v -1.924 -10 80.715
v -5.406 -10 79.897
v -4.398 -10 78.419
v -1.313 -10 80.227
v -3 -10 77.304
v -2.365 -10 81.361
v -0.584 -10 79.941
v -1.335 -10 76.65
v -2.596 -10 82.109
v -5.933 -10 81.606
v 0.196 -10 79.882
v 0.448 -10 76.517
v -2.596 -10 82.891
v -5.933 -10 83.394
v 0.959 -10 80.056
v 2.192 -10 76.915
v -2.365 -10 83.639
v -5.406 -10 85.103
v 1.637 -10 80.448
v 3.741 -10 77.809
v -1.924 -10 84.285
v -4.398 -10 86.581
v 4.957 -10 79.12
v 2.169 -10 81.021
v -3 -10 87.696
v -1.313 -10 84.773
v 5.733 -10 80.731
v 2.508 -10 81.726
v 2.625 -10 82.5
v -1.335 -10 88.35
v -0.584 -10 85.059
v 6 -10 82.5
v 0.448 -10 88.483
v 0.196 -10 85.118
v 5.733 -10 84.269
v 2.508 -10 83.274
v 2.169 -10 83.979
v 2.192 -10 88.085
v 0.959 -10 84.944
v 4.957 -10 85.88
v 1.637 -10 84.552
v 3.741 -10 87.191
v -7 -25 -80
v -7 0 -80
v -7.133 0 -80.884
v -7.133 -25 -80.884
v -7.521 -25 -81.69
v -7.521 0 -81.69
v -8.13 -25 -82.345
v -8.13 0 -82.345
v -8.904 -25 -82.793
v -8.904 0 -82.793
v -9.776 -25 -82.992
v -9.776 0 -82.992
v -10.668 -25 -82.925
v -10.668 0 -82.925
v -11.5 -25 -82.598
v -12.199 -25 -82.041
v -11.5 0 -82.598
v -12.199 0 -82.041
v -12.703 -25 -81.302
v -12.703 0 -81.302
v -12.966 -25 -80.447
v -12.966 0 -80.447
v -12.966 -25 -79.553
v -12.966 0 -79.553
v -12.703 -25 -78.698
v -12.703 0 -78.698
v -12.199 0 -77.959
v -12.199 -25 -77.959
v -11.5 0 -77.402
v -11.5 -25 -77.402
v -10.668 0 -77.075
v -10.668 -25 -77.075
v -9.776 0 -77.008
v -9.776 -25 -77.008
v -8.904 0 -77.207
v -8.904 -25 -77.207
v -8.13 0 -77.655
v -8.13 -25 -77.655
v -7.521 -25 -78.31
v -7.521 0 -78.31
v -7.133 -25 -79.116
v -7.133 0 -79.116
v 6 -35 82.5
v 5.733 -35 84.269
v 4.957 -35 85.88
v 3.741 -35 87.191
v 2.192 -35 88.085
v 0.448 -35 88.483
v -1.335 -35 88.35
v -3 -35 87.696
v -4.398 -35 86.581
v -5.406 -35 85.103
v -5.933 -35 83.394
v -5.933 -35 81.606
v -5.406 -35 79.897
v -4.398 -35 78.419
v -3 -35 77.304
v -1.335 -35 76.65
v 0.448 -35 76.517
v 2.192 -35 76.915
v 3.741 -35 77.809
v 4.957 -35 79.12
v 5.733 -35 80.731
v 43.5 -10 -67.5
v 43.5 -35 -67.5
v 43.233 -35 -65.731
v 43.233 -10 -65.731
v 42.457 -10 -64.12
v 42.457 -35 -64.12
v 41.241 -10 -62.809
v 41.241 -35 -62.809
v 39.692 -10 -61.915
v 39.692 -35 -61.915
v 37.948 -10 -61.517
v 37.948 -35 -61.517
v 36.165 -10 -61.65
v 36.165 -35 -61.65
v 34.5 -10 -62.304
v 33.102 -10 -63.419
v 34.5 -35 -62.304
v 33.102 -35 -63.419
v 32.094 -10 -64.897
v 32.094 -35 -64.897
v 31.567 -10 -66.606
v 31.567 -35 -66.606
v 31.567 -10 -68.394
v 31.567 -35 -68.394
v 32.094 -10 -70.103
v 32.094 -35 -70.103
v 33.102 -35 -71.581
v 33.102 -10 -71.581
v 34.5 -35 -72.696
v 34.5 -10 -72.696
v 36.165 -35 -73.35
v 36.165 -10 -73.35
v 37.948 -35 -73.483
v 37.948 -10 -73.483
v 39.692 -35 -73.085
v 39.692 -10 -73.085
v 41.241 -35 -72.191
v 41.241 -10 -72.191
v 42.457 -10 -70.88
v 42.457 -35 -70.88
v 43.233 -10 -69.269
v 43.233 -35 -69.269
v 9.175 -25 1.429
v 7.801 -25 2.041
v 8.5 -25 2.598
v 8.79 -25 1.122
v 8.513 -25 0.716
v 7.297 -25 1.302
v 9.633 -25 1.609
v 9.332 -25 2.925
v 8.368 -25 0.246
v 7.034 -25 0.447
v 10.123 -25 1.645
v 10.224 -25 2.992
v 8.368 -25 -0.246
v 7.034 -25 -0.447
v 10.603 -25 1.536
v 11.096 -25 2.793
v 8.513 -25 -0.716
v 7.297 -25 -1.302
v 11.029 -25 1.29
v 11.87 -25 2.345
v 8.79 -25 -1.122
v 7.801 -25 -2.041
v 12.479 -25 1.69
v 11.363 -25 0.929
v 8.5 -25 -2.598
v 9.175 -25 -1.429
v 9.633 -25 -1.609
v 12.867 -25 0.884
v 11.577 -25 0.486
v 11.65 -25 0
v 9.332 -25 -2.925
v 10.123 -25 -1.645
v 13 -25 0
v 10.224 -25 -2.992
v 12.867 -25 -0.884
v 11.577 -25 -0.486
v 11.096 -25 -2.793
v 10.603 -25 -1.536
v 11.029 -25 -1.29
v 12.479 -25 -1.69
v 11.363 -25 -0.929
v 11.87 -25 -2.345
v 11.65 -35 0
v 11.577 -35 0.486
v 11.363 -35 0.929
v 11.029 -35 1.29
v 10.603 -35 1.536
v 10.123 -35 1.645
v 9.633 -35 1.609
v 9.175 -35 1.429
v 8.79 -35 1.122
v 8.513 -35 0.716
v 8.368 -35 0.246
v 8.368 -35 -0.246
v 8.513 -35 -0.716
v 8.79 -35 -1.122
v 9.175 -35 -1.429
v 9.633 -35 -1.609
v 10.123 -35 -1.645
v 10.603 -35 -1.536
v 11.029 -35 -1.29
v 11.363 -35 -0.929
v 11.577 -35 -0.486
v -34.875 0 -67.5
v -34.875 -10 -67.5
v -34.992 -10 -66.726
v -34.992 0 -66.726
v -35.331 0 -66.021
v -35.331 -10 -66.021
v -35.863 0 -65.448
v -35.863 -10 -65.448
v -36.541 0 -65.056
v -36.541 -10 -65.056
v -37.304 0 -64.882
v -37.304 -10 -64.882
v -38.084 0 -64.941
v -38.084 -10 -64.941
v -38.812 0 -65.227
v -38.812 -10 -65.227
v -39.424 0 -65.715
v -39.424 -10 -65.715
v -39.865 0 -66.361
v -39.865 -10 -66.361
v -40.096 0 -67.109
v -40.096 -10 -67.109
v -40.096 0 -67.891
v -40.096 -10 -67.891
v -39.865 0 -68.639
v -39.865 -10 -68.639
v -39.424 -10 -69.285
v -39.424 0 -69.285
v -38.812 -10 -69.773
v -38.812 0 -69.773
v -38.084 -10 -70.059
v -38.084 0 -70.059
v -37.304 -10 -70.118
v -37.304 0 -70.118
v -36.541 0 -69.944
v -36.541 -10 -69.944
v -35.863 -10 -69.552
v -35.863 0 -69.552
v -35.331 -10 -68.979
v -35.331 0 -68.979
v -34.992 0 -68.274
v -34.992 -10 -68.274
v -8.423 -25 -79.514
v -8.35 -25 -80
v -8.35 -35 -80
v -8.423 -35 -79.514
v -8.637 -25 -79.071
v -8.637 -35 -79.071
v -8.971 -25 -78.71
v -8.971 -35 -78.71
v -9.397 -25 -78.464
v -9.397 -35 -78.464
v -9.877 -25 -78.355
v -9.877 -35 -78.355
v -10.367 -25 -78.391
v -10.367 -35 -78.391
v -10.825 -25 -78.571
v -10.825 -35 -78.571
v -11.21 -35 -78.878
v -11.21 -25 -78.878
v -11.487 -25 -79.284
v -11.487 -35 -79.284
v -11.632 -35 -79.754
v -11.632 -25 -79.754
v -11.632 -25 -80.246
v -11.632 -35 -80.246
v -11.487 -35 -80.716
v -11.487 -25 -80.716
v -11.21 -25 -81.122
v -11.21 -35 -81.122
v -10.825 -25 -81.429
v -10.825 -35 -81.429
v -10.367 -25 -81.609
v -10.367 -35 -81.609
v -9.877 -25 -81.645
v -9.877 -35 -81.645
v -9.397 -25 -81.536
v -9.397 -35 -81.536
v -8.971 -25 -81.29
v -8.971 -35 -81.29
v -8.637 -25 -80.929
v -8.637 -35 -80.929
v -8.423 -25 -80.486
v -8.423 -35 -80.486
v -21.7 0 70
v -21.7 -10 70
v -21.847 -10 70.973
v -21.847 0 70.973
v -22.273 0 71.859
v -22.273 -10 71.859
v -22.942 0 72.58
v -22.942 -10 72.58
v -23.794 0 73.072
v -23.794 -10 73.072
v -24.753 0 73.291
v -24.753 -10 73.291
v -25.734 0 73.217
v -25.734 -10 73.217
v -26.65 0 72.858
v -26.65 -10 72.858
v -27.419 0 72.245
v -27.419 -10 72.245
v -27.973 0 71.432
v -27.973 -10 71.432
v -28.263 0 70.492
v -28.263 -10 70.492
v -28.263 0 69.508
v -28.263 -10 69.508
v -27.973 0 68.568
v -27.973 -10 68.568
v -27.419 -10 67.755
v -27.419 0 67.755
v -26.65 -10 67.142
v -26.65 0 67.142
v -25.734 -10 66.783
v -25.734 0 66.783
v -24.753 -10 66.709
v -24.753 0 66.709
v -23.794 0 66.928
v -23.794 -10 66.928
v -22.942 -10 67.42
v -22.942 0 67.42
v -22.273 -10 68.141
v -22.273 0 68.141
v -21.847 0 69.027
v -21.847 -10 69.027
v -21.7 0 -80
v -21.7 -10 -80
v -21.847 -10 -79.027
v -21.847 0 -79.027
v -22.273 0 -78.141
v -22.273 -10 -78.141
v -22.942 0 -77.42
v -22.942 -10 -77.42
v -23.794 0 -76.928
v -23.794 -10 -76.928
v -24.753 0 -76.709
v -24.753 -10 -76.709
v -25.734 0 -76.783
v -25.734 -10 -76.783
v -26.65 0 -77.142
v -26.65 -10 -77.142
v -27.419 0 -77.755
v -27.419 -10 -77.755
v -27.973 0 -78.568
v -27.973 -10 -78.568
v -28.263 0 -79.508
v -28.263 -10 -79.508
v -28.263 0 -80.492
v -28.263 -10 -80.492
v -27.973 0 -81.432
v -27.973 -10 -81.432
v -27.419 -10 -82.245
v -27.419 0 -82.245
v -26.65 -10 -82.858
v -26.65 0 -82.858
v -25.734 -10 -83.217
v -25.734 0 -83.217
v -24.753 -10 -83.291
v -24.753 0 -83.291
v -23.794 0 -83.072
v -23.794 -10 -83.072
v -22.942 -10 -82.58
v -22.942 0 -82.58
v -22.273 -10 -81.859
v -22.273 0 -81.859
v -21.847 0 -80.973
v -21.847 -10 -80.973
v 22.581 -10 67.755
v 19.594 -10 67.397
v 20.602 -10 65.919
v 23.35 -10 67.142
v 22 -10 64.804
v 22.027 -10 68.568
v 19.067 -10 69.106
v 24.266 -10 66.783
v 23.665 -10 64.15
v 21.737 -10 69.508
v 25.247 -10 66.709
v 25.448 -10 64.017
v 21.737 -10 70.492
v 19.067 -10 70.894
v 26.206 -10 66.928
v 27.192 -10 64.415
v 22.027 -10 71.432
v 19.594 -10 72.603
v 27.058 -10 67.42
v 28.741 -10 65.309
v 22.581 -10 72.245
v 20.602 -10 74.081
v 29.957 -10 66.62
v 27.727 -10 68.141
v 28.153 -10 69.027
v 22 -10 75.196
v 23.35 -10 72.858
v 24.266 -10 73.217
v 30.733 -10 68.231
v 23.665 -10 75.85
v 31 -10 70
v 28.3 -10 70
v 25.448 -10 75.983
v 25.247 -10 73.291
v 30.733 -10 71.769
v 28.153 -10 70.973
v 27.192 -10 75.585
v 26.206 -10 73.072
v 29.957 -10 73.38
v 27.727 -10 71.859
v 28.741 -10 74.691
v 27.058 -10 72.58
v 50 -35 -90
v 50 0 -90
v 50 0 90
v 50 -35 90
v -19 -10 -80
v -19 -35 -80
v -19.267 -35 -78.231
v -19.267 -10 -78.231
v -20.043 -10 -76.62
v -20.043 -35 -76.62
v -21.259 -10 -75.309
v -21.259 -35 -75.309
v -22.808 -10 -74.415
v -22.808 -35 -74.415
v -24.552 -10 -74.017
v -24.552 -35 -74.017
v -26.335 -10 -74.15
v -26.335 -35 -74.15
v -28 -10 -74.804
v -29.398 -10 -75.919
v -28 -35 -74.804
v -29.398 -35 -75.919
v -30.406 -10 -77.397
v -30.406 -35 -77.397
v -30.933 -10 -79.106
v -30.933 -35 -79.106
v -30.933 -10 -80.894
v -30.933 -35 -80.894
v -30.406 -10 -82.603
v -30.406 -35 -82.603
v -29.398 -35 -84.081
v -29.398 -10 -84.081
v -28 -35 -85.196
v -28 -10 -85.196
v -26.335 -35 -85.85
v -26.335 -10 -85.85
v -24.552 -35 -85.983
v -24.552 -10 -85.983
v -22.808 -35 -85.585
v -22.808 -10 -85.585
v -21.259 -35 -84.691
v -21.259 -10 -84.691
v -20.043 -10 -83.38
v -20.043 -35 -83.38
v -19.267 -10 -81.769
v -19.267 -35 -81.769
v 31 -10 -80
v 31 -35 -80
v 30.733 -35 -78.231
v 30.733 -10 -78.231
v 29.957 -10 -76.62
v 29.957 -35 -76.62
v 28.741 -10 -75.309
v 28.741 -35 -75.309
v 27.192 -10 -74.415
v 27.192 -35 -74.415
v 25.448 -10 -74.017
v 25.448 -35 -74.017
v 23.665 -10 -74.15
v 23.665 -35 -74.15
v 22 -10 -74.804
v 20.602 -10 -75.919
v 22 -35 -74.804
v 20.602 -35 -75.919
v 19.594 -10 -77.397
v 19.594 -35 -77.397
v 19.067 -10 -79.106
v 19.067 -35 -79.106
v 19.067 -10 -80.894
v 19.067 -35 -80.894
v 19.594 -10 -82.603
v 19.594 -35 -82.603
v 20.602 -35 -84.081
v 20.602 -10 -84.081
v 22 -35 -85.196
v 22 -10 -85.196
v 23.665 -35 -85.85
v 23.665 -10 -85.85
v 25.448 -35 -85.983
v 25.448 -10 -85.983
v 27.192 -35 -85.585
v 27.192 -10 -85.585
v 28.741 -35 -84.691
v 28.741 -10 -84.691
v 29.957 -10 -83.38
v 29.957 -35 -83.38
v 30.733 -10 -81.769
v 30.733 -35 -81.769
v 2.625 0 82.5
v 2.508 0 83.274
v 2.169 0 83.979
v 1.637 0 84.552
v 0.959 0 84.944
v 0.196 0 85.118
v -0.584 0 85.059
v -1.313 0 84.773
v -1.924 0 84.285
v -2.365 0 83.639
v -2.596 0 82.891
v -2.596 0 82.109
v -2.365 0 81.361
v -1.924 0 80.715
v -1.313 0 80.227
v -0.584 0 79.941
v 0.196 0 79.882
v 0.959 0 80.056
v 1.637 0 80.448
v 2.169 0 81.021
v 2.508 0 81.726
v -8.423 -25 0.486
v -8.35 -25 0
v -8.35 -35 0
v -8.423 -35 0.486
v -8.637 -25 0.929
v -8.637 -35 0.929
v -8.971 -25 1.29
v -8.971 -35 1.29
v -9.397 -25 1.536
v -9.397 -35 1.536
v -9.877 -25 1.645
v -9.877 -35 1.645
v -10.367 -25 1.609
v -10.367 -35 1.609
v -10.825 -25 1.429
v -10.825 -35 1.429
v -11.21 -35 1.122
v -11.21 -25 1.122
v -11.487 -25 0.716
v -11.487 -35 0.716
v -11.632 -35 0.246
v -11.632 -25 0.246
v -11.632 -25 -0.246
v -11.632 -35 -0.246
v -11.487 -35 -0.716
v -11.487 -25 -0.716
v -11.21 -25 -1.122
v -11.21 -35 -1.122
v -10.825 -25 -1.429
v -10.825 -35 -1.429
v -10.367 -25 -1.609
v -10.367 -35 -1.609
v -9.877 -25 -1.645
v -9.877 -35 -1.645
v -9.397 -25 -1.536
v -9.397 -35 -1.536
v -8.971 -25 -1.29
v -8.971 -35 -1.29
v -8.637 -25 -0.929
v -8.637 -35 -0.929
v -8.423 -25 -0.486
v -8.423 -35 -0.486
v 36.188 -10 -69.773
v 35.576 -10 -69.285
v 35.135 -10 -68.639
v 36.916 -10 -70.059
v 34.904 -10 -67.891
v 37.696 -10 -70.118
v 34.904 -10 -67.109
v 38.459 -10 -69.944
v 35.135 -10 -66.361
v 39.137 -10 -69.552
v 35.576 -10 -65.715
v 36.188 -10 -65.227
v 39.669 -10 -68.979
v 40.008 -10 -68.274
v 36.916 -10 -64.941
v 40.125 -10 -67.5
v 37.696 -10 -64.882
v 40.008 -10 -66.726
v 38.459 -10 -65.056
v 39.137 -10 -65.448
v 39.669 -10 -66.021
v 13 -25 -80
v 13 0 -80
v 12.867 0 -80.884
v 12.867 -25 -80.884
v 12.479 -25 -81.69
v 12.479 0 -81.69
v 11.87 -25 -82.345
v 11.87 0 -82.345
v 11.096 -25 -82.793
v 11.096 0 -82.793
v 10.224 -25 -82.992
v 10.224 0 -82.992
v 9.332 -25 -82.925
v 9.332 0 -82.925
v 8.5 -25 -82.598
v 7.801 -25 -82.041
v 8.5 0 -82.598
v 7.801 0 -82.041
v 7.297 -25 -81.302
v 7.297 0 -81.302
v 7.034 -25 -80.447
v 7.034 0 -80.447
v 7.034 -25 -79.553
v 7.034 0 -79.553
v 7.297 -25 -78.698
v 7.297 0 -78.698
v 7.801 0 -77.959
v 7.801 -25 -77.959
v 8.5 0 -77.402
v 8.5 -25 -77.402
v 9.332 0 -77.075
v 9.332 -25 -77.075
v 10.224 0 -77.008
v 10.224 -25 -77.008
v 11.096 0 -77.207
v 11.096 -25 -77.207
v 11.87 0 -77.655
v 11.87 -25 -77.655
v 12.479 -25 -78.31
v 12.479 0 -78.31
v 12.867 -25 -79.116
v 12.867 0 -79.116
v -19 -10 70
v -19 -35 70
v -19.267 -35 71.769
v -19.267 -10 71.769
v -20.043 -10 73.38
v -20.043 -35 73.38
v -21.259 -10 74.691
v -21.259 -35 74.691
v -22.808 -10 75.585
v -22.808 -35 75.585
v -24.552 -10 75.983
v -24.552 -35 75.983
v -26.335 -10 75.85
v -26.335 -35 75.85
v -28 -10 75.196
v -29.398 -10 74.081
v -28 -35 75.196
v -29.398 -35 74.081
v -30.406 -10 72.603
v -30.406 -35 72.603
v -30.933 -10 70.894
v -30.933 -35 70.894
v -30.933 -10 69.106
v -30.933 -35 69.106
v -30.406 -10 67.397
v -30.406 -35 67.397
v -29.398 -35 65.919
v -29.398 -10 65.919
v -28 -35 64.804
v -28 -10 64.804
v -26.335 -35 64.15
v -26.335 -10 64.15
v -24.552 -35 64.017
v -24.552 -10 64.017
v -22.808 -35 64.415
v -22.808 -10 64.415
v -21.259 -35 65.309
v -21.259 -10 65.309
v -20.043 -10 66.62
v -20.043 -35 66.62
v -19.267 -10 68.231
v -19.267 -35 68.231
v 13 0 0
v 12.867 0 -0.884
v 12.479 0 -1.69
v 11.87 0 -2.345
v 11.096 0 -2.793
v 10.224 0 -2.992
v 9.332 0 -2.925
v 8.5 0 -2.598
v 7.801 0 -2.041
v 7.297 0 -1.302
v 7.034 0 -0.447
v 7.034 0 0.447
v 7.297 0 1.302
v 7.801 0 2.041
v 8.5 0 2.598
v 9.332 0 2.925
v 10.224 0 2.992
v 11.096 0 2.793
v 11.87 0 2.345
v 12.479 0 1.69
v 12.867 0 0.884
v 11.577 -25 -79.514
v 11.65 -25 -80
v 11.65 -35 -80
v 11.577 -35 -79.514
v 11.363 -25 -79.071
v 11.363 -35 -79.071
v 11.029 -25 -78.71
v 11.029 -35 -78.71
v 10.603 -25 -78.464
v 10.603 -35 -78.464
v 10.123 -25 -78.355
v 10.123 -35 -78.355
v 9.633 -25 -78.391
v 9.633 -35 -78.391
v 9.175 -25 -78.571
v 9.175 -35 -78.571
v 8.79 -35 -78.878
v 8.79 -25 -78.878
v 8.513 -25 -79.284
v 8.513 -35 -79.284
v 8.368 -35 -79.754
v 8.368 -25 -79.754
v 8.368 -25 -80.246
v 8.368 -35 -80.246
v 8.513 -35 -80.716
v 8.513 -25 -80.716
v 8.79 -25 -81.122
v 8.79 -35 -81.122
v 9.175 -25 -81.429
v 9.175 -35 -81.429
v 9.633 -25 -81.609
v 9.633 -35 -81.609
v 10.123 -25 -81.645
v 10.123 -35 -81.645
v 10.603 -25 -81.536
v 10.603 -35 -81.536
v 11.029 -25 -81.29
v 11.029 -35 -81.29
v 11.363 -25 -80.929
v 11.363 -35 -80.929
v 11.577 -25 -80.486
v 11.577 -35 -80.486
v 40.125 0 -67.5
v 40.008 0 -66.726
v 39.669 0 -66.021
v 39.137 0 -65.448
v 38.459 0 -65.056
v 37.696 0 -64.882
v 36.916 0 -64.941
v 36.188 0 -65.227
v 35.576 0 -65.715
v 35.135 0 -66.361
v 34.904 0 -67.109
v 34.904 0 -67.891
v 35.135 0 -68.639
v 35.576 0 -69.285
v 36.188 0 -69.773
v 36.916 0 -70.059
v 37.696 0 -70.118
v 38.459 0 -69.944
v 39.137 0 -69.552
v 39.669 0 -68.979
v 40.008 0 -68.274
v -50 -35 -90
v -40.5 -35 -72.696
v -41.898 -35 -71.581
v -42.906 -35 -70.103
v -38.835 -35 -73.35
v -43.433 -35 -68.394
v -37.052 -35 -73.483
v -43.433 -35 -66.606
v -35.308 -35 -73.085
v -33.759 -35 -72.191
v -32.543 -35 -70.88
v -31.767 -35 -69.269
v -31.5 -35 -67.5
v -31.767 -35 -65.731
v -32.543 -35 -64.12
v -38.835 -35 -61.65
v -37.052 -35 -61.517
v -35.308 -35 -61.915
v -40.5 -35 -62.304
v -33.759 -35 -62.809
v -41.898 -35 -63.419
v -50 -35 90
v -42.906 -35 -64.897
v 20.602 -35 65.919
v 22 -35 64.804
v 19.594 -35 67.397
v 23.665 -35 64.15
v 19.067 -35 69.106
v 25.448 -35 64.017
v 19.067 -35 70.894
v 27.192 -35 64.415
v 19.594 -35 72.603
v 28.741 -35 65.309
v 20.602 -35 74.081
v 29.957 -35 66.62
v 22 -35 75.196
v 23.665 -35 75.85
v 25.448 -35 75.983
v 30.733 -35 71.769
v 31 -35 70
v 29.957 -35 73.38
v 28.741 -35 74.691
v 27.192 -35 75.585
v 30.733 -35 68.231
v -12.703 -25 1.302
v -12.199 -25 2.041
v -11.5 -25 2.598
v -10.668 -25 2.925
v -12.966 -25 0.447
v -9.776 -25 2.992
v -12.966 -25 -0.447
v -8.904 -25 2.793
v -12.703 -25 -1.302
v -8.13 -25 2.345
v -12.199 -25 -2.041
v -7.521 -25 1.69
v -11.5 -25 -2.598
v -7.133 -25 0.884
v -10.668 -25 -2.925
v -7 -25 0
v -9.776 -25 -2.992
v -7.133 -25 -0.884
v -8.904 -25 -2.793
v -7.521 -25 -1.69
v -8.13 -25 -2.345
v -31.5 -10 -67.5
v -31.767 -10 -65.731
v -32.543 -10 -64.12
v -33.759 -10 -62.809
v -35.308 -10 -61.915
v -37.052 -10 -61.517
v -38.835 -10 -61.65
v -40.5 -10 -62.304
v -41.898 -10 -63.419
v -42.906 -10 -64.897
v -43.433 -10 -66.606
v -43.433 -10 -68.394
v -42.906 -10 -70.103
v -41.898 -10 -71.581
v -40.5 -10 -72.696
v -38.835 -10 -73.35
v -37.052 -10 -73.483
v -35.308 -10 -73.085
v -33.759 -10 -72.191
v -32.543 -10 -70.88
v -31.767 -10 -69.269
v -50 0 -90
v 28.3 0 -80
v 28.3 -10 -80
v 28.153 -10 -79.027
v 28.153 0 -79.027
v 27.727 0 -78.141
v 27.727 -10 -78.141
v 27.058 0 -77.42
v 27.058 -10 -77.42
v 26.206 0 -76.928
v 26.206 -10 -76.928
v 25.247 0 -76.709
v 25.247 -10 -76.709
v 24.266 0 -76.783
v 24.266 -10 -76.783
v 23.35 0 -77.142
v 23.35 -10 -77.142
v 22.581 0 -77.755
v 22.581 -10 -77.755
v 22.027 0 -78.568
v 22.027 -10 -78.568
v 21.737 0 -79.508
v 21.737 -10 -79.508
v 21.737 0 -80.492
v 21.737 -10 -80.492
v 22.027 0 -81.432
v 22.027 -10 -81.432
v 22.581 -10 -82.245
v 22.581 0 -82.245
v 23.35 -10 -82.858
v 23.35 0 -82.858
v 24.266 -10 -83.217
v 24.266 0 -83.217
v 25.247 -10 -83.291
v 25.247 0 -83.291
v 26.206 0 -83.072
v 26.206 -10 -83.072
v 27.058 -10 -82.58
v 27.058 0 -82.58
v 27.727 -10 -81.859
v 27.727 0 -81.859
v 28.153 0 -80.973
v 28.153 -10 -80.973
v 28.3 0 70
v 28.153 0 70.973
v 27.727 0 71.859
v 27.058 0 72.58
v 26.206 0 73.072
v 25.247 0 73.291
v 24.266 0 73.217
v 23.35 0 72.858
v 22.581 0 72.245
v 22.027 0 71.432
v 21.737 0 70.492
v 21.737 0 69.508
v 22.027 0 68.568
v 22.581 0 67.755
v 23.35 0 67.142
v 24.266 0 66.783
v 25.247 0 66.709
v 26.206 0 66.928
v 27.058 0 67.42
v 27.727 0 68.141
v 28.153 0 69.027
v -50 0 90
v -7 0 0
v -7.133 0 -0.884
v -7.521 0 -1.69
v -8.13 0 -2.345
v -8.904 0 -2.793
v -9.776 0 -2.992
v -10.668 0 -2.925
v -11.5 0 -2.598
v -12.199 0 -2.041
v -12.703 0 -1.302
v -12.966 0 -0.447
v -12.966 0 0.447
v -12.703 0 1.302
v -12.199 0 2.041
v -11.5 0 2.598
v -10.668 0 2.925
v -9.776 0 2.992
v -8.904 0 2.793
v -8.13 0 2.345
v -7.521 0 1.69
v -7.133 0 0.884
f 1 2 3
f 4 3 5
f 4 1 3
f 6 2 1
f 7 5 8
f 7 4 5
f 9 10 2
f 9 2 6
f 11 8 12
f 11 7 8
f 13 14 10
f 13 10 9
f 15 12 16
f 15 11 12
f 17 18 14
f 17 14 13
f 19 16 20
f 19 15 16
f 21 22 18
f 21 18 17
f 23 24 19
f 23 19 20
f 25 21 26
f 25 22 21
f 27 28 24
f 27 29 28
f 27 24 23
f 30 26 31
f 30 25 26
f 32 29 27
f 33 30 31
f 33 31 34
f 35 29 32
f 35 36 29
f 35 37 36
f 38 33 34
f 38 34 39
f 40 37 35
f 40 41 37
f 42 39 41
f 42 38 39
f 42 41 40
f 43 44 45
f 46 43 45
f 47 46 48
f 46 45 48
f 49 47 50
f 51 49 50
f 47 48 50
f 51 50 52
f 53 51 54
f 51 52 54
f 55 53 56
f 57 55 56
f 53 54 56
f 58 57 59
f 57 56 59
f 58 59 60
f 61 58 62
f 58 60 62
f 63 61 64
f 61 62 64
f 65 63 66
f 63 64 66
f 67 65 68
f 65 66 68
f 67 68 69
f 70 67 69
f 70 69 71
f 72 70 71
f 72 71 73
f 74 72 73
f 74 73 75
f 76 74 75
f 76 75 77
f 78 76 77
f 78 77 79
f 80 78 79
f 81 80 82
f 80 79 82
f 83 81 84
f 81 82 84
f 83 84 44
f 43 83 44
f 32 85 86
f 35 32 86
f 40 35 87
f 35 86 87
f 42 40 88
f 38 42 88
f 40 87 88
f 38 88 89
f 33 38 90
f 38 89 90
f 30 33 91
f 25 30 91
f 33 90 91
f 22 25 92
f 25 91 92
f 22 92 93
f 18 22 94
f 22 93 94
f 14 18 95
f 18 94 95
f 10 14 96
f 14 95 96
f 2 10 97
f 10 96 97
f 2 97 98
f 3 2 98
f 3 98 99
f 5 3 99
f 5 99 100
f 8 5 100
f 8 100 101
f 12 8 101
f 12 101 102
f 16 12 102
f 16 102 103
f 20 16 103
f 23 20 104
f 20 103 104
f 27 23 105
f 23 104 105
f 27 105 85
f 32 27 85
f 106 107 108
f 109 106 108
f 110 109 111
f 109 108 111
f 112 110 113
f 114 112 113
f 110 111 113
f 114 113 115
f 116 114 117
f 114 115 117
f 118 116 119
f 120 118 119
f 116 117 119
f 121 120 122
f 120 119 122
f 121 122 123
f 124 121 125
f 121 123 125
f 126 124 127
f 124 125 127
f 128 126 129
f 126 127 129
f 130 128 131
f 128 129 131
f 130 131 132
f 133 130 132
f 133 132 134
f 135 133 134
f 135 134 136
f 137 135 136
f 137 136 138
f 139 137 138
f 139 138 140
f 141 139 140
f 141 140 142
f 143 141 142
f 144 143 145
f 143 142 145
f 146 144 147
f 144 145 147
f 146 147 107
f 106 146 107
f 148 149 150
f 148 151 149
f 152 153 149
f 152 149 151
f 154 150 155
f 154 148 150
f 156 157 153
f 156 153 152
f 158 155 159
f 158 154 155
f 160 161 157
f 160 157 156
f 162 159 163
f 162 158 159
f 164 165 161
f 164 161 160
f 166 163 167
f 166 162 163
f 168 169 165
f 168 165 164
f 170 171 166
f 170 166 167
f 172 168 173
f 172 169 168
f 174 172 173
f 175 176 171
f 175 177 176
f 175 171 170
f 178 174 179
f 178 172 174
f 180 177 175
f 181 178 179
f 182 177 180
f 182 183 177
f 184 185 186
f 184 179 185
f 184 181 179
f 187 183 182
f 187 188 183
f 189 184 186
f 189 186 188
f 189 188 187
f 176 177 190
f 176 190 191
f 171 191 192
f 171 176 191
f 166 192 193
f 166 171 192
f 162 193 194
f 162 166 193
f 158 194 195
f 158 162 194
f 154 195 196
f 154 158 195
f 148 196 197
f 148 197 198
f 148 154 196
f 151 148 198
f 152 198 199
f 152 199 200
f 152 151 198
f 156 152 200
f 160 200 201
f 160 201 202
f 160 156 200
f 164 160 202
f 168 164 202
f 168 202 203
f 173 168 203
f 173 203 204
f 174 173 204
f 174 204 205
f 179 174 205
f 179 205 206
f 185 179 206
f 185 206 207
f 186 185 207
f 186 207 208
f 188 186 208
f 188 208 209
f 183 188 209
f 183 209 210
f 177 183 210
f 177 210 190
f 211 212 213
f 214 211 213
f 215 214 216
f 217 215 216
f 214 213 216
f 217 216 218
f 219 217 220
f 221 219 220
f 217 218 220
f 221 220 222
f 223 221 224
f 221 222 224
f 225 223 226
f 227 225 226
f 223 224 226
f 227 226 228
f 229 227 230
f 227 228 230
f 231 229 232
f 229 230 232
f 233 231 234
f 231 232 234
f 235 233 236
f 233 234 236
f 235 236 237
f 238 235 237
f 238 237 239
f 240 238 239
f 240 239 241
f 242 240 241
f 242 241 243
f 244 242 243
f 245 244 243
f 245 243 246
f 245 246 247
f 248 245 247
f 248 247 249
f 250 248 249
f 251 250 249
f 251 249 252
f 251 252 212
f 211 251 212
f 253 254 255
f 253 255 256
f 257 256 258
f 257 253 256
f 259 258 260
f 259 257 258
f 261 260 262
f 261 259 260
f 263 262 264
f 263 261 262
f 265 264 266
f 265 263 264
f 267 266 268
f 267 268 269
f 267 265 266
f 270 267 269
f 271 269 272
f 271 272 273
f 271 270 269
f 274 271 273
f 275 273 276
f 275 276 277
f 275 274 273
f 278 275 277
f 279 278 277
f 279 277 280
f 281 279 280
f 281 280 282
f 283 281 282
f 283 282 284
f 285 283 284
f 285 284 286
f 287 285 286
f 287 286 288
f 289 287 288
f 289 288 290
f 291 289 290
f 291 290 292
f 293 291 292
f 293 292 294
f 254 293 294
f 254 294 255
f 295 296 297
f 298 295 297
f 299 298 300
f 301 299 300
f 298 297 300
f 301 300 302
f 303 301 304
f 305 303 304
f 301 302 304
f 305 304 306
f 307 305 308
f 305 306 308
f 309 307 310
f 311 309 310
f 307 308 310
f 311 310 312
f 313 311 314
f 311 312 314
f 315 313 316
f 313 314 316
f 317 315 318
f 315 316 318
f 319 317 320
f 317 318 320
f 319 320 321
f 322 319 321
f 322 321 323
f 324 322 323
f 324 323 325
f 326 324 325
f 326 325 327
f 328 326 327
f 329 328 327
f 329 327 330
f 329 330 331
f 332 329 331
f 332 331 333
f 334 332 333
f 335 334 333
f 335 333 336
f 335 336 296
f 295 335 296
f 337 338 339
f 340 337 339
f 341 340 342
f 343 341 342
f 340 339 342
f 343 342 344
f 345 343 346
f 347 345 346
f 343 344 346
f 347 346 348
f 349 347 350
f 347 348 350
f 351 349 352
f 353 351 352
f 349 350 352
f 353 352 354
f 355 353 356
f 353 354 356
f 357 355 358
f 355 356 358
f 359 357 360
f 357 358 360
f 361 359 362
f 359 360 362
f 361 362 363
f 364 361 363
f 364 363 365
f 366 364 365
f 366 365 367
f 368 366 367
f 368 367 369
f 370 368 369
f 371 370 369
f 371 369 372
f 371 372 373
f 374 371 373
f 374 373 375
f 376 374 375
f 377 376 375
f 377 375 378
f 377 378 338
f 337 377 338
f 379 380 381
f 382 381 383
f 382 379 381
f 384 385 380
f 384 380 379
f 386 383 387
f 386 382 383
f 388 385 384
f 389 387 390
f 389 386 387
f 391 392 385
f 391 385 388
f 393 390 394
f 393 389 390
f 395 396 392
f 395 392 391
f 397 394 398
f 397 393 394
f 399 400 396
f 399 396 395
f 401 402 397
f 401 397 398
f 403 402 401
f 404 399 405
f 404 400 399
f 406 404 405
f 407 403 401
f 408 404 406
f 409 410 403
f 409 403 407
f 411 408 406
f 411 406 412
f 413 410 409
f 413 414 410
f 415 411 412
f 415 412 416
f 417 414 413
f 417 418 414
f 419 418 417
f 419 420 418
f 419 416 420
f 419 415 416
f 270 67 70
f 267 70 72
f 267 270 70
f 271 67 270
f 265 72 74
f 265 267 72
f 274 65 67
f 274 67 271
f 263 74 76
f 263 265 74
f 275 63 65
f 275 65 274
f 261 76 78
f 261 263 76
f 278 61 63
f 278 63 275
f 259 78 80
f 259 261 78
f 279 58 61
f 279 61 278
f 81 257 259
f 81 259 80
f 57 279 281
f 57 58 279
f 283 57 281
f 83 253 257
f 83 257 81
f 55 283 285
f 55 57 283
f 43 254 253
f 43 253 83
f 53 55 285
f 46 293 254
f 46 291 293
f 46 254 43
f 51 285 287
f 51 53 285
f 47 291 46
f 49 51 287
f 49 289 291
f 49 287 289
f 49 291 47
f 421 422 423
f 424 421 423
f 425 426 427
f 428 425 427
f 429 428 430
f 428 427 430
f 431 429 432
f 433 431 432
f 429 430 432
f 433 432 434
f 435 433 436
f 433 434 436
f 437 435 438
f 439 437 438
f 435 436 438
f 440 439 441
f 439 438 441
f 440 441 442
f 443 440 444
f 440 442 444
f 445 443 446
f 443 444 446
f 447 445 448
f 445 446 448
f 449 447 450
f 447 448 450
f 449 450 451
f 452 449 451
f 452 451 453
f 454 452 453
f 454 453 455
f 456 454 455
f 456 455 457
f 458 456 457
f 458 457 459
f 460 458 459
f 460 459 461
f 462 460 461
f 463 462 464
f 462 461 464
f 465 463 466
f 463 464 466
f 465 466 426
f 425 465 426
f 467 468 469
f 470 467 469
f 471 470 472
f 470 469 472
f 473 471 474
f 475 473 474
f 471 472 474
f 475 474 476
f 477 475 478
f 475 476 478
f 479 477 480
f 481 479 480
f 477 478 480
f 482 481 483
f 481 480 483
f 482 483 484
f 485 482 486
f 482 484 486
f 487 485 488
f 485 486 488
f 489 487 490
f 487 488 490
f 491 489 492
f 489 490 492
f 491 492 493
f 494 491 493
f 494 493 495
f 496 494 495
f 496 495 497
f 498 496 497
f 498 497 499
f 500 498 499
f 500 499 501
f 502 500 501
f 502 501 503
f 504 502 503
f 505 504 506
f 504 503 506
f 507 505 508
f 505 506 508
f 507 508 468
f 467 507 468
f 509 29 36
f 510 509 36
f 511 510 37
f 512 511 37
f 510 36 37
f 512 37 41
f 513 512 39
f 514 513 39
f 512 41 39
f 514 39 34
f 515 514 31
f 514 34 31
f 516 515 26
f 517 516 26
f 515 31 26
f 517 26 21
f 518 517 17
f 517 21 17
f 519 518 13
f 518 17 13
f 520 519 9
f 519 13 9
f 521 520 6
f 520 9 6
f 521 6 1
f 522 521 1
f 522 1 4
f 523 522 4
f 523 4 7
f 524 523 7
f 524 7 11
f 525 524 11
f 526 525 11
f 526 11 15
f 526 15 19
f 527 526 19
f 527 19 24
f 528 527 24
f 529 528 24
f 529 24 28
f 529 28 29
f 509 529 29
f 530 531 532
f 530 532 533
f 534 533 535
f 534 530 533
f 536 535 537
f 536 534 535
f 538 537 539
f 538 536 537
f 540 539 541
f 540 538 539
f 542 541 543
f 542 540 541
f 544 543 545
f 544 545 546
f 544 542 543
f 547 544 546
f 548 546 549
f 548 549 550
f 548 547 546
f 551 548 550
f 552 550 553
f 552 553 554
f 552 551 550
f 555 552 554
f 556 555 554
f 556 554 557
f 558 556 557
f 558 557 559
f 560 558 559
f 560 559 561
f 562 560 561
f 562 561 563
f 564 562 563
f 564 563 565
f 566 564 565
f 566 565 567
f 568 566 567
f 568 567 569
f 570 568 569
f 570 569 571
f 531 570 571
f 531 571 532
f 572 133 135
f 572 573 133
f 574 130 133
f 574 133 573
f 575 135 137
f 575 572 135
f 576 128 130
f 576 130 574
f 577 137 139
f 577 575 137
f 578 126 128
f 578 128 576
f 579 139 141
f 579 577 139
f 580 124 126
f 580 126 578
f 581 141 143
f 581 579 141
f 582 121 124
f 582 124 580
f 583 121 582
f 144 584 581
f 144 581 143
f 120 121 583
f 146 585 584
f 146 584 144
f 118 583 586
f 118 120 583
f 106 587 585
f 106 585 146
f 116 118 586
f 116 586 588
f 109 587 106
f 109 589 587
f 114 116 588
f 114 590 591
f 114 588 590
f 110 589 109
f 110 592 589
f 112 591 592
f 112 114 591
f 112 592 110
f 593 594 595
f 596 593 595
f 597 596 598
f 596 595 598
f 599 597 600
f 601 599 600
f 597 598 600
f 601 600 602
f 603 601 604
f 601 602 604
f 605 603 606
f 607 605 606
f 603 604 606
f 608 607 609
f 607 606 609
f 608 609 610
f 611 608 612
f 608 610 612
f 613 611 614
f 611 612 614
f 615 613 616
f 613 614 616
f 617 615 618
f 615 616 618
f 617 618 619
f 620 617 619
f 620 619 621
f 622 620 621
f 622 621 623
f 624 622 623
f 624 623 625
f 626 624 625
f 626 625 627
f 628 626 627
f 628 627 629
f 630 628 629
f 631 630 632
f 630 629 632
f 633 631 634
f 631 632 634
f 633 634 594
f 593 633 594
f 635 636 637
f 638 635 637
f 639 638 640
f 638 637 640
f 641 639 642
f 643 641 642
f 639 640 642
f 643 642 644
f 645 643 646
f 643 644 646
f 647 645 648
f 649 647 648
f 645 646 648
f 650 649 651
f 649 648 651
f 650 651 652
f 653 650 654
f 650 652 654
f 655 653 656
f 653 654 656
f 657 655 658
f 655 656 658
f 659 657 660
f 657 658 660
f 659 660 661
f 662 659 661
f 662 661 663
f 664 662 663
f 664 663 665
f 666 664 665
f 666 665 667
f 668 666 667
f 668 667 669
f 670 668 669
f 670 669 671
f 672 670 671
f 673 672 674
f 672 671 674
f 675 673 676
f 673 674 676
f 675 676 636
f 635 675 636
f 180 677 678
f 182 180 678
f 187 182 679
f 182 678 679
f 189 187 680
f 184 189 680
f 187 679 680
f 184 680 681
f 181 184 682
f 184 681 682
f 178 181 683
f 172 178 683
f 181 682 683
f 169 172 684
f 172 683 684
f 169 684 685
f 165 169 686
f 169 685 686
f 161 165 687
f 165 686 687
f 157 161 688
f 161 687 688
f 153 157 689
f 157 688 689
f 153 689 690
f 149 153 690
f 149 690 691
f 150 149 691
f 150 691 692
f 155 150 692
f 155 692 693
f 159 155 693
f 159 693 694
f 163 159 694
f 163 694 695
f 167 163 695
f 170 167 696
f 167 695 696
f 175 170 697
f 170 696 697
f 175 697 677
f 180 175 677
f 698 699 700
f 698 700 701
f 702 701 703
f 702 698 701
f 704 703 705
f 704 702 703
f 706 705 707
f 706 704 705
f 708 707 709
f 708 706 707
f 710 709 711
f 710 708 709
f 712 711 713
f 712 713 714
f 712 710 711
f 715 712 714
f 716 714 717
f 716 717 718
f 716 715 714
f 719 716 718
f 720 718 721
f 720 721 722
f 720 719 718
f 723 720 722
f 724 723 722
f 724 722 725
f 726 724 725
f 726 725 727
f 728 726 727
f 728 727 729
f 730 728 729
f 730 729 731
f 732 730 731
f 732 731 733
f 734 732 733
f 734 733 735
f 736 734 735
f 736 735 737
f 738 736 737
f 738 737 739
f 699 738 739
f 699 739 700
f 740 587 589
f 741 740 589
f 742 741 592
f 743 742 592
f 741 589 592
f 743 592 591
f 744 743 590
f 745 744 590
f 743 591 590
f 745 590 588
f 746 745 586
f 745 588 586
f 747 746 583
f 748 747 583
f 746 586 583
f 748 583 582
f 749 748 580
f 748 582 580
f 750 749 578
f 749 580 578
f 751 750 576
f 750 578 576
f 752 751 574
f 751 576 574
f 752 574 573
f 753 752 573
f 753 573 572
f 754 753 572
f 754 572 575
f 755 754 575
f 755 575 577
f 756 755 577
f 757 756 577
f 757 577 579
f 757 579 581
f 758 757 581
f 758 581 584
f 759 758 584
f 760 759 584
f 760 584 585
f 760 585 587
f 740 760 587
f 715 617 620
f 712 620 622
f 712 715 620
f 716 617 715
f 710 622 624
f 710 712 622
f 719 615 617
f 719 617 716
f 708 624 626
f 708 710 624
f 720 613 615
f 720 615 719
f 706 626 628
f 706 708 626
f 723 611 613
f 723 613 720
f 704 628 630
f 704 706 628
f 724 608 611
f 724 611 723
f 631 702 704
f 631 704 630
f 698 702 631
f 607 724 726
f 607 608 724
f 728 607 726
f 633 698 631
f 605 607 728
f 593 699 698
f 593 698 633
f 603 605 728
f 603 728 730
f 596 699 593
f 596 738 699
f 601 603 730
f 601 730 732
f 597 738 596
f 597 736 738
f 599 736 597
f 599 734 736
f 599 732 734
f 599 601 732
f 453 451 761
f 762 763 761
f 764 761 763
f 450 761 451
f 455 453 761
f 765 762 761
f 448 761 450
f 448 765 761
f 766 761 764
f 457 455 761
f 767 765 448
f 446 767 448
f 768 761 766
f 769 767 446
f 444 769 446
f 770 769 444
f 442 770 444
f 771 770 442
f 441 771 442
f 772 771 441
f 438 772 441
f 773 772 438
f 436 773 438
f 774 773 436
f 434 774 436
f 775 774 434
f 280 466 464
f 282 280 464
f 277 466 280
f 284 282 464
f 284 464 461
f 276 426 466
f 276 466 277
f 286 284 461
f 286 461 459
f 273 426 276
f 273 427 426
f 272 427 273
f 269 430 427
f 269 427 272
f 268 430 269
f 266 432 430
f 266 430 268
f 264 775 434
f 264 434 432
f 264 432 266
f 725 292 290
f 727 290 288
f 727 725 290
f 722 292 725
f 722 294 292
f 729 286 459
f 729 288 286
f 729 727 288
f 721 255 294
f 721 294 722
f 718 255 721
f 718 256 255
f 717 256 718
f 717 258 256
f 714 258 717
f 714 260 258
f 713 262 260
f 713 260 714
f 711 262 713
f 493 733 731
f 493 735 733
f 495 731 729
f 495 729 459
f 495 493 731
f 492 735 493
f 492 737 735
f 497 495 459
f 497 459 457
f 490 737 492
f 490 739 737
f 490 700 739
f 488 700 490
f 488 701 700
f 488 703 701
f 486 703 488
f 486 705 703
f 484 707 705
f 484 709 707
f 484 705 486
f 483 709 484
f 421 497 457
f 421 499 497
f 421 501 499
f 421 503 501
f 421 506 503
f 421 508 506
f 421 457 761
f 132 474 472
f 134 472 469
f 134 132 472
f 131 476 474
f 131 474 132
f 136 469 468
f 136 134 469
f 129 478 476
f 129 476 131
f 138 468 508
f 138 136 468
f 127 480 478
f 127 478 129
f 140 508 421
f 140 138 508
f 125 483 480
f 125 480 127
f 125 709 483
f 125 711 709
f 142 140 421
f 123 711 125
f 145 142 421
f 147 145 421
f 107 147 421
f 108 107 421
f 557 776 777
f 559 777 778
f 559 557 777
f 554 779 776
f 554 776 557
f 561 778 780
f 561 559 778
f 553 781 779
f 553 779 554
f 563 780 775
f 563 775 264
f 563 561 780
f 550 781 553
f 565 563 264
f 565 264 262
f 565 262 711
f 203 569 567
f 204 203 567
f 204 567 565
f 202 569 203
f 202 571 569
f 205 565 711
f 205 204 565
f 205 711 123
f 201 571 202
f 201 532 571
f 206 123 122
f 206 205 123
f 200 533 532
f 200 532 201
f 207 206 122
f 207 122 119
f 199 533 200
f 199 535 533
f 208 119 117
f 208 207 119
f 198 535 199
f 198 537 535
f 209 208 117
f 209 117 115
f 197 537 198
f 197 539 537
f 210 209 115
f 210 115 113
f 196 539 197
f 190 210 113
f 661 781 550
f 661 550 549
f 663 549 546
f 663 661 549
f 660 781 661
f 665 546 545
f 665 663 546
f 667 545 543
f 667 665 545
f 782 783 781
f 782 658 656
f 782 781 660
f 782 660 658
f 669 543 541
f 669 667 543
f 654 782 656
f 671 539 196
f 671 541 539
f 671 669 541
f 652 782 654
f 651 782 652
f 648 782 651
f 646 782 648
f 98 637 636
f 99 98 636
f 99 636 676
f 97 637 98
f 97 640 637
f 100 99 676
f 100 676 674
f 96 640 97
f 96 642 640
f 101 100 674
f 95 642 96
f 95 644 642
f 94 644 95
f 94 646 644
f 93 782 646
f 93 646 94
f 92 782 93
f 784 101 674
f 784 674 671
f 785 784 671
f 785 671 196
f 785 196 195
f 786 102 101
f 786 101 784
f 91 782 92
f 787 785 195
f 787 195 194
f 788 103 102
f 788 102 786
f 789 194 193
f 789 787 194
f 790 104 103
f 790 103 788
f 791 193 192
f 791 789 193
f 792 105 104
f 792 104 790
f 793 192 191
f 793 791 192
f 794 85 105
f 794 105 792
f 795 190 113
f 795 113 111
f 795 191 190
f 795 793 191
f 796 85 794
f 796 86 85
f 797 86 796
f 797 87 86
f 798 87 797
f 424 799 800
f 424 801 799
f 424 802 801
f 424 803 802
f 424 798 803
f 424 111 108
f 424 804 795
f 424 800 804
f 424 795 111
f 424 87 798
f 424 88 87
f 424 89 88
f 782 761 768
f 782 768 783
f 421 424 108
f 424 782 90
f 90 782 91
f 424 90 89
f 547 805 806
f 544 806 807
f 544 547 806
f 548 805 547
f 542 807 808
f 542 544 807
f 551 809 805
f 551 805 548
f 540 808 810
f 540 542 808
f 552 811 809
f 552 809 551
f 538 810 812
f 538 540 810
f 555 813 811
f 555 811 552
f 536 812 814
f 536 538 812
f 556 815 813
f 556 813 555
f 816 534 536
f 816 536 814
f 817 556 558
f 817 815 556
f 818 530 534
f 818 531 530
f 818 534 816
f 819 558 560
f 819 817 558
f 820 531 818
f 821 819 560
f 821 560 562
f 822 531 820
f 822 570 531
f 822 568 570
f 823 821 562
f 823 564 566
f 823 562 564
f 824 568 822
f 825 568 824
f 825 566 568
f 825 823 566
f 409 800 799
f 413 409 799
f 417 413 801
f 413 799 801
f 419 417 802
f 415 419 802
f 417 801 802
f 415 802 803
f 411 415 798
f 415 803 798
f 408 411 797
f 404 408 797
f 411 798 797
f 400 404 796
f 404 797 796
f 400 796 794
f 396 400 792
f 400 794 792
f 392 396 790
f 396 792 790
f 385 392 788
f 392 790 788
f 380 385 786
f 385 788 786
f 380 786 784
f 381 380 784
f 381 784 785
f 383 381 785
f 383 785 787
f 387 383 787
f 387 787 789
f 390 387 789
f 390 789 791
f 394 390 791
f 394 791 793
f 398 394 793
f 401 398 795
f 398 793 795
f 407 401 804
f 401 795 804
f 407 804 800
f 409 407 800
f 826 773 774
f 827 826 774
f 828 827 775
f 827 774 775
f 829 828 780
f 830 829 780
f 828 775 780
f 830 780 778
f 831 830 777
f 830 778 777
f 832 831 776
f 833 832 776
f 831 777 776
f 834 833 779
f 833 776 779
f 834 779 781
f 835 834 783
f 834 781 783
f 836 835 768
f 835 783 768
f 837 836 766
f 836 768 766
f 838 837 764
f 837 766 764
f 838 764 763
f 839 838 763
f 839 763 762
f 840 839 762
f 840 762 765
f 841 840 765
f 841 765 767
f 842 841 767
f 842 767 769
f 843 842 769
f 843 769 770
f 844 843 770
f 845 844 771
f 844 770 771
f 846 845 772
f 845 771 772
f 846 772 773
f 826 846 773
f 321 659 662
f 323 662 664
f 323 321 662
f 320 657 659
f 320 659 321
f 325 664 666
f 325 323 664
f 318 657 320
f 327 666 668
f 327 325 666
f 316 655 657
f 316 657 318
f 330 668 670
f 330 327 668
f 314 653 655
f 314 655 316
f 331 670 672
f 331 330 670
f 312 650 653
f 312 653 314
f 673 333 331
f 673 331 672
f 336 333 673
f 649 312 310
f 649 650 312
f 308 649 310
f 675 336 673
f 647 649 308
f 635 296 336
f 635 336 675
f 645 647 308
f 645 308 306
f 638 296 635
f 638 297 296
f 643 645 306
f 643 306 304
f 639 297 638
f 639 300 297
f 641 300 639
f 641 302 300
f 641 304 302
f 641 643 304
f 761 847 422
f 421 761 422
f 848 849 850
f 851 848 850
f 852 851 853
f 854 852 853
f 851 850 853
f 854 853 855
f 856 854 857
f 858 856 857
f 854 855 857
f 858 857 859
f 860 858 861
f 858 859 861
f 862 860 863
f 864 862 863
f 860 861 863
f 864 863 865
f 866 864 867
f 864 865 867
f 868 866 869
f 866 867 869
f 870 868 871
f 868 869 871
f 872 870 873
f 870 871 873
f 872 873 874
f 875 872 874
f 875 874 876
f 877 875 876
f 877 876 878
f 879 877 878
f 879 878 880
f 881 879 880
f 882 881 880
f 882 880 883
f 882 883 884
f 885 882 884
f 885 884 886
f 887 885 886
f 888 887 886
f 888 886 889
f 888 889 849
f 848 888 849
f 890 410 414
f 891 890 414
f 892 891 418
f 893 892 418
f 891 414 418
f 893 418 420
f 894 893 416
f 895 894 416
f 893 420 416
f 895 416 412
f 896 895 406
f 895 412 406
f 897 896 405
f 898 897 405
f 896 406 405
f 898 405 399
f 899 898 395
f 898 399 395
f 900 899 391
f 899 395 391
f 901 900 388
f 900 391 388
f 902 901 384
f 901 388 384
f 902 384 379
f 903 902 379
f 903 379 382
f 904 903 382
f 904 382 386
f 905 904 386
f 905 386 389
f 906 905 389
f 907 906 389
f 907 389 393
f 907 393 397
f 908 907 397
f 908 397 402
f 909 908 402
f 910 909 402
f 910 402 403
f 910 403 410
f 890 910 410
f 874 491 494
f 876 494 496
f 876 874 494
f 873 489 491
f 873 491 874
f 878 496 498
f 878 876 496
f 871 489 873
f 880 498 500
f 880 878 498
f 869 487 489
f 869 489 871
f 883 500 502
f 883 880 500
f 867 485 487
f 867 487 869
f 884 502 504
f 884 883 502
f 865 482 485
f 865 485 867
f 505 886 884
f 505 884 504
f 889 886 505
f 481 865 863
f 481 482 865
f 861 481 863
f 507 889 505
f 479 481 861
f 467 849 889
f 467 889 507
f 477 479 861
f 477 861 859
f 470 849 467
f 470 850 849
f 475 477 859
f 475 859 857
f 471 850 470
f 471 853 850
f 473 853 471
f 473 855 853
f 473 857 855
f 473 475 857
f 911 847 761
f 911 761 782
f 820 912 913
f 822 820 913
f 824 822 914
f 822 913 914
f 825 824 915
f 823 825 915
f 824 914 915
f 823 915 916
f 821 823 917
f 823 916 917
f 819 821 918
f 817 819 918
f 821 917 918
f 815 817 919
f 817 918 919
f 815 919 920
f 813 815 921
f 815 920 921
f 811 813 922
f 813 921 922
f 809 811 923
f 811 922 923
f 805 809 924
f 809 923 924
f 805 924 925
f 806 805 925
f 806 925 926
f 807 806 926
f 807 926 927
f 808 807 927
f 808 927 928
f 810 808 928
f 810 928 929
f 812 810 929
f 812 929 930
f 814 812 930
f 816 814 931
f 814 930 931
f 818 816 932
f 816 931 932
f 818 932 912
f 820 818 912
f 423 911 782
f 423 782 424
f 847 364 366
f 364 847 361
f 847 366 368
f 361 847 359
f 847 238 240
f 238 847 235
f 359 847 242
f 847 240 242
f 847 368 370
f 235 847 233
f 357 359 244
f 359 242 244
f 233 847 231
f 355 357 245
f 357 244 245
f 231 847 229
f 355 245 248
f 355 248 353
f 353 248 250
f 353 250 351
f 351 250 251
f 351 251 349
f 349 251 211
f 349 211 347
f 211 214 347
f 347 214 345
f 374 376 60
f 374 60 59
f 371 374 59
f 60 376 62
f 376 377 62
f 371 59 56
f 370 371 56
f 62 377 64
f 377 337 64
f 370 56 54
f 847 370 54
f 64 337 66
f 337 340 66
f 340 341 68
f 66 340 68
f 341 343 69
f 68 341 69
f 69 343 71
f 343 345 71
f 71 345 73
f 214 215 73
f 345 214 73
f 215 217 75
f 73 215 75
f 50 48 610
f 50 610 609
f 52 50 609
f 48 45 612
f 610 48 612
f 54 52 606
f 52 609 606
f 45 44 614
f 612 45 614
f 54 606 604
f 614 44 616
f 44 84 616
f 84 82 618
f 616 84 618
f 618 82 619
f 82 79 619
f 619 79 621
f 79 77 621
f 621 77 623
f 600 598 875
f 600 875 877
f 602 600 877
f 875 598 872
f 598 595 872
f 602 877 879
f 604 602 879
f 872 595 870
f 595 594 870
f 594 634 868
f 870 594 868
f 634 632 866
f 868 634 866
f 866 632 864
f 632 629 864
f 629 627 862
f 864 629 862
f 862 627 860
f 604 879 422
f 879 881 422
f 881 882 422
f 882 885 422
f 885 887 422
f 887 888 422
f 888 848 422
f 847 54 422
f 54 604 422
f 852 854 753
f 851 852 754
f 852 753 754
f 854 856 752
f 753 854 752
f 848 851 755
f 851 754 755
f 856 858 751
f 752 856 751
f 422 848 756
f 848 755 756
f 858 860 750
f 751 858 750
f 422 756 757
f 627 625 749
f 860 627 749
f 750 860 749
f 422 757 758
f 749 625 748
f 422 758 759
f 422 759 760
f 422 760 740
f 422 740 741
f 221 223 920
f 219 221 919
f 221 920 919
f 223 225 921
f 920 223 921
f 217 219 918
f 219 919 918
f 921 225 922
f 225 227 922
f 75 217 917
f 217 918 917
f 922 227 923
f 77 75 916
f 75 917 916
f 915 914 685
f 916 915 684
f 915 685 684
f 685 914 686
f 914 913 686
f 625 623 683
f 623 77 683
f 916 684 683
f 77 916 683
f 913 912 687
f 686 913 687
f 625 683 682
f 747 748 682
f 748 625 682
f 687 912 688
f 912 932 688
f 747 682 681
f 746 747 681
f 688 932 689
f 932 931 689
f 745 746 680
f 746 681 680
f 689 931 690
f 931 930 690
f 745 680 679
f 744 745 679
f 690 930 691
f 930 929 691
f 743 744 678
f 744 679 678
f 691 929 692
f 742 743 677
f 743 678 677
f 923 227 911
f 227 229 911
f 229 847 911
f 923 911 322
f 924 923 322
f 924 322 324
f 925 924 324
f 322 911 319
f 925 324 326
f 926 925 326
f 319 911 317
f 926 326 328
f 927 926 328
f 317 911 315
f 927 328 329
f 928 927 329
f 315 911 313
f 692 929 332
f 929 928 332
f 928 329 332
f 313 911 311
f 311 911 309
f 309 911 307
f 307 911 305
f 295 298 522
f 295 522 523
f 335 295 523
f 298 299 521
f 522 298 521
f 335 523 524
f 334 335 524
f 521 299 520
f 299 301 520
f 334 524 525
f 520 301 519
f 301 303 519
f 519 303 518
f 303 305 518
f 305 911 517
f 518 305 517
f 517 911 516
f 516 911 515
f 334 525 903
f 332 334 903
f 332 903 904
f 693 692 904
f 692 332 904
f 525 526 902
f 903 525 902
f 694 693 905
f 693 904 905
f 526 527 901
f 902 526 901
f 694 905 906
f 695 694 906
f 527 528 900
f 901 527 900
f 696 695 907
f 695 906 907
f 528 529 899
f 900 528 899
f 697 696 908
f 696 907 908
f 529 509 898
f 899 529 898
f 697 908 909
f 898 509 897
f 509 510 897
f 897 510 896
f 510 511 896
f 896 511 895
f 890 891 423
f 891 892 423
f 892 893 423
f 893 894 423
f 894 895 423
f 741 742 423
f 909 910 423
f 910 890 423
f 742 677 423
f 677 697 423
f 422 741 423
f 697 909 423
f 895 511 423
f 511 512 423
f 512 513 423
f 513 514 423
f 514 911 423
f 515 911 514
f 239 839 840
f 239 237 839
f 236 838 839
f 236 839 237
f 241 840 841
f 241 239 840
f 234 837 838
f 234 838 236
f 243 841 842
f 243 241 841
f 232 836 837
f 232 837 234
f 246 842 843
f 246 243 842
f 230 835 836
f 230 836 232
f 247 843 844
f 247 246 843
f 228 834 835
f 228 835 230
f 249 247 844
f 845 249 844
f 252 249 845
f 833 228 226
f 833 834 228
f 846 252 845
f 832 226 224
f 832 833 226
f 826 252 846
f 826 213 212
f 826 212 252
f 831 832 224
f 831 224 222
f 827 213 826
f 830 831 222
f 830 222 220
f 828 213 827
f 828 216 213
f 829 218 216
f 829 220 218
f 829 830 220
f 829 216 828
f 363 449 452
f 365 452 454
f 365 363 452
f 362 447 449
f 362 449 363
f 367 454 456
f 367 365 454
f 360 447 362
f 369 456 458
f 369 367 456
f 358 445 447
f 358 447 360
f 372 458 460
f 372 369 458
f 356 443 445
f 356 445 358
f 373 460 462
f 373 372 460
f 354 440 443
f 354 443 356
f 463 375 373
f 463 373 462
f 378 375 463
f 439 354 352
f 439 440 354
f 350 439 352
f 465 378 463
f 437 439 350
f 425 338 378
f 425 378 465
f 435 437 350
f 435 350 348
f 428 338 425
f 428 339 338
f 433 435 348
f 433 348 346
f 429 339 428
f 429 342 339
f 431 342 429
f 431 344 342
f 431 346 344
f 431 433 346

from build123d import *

# Parameters (mm, degrees)
SKETCH_W        = 100
SKETCH_H        = 180
SKETCH_R        = 1.65
PAD_DEPTH       = 35
SKETCH001_R     = 3.3
SKETCH001_R_2   = 2.625
POCKET_DEPTH    = 35.001
SKETCH002_R     = 6
POCKET001_DEPTH = 25
SKETCH003_R     = 3
POCKET002_DEPTH = 25


with BuildPart() as part:
    # Sketch → Pad (new body)
    with BuildSketch(Plane.XZ):
        Rectangle(SKETCH_W, SKETCH_H)
        with Locations((10, 0)):
            Circle(SKETCH_R, mode=Mode.SUBTRACT)
        with Locations((-10, 0)):
            Circle(SKETCH_R, mode=Mode.SUBTRACT)
        with Locations((10, -80)):
            Circle(SKETCH_R, mode=Mode.SUBTRACT)
        with Locations((-10, -80)):
            Circle(SKETCH_R, mode=Mode.SUBTRACT)
    extrude(amount=PAD_DEPTH)

    # Sketch001 (on Face10 of Pad) → Pocket (cut, through all)
    with BuildSketch(Plane.XZ.offset(35)):
        with Locations((25, -80)):
            Circle(SKETCH001_R)
        with Locations((-25, -80)):
            Circle(SKETCH001_R)
        with Locations((25, 70)):
            Circle(SKETCH001_R)
        with Locations((-25, 70)):
            Circle(SKETCH001_R)
        with Locations((0, 82.5)):
            Circle(SKETCH001_R_2)
        with Locations((-37.5, -67.5)):
            Circle(SKETCH001_R_2)
        with Locations((37.5, -67.5)):
            Circle(SKETCH001_R_2)
    extrude(amount=-POCKET_DEPTH, mode=Mode.SUBTRACT)

    # Sketch002 (on Face5 of Pocket) → Pocket001 (cut)
    with BuildSketch(Plane.XZ.offset(35)):
        with Locations((25, 70)):
            Circle(SKETCH002_R)
        with Locations((-25, 70)):
            Circle(SKETCH002_R)
        with Locations((25, -80)):
            Circle(SKETCH002_R)
        with Locations((-25, -80)):
            Circle(SKETCH002_R)
        with Locations((-37.5, -67.5)):
            Circle(SKETCH002_R)
        with Locations((37.5, -67.5)):
            Circle(SKETCH002_R)
        with Locations((0, 82.5)):
            Circle(SKETCH002_R)
    extrude(amount=-POCKET001_DEPTH, mode=Mode.SUBTRACT)

    # Sketch003 (on Face4 of Pocket001) → Pocket002 (cut)
    with BuildSketch(Plane(origin=(0, 0, 0), x_dir=(1, 0, 0), z_dir=(0, 1, 0))):
        with Locations((-10, 80)):
            Circle(SKETCH003_R)
        with Locations((10, 80)):
            Circle(SKETCH003_R)
        with Locations((-10, 0)):
            Circle(SKETCH003_R)
        with Locations((10, 0)):
            Circle(SKETCH003_R)
    extrude(amount=-POCKET002_DEPTH, mode=Mode.SUBTRACT)


solid = part.part
